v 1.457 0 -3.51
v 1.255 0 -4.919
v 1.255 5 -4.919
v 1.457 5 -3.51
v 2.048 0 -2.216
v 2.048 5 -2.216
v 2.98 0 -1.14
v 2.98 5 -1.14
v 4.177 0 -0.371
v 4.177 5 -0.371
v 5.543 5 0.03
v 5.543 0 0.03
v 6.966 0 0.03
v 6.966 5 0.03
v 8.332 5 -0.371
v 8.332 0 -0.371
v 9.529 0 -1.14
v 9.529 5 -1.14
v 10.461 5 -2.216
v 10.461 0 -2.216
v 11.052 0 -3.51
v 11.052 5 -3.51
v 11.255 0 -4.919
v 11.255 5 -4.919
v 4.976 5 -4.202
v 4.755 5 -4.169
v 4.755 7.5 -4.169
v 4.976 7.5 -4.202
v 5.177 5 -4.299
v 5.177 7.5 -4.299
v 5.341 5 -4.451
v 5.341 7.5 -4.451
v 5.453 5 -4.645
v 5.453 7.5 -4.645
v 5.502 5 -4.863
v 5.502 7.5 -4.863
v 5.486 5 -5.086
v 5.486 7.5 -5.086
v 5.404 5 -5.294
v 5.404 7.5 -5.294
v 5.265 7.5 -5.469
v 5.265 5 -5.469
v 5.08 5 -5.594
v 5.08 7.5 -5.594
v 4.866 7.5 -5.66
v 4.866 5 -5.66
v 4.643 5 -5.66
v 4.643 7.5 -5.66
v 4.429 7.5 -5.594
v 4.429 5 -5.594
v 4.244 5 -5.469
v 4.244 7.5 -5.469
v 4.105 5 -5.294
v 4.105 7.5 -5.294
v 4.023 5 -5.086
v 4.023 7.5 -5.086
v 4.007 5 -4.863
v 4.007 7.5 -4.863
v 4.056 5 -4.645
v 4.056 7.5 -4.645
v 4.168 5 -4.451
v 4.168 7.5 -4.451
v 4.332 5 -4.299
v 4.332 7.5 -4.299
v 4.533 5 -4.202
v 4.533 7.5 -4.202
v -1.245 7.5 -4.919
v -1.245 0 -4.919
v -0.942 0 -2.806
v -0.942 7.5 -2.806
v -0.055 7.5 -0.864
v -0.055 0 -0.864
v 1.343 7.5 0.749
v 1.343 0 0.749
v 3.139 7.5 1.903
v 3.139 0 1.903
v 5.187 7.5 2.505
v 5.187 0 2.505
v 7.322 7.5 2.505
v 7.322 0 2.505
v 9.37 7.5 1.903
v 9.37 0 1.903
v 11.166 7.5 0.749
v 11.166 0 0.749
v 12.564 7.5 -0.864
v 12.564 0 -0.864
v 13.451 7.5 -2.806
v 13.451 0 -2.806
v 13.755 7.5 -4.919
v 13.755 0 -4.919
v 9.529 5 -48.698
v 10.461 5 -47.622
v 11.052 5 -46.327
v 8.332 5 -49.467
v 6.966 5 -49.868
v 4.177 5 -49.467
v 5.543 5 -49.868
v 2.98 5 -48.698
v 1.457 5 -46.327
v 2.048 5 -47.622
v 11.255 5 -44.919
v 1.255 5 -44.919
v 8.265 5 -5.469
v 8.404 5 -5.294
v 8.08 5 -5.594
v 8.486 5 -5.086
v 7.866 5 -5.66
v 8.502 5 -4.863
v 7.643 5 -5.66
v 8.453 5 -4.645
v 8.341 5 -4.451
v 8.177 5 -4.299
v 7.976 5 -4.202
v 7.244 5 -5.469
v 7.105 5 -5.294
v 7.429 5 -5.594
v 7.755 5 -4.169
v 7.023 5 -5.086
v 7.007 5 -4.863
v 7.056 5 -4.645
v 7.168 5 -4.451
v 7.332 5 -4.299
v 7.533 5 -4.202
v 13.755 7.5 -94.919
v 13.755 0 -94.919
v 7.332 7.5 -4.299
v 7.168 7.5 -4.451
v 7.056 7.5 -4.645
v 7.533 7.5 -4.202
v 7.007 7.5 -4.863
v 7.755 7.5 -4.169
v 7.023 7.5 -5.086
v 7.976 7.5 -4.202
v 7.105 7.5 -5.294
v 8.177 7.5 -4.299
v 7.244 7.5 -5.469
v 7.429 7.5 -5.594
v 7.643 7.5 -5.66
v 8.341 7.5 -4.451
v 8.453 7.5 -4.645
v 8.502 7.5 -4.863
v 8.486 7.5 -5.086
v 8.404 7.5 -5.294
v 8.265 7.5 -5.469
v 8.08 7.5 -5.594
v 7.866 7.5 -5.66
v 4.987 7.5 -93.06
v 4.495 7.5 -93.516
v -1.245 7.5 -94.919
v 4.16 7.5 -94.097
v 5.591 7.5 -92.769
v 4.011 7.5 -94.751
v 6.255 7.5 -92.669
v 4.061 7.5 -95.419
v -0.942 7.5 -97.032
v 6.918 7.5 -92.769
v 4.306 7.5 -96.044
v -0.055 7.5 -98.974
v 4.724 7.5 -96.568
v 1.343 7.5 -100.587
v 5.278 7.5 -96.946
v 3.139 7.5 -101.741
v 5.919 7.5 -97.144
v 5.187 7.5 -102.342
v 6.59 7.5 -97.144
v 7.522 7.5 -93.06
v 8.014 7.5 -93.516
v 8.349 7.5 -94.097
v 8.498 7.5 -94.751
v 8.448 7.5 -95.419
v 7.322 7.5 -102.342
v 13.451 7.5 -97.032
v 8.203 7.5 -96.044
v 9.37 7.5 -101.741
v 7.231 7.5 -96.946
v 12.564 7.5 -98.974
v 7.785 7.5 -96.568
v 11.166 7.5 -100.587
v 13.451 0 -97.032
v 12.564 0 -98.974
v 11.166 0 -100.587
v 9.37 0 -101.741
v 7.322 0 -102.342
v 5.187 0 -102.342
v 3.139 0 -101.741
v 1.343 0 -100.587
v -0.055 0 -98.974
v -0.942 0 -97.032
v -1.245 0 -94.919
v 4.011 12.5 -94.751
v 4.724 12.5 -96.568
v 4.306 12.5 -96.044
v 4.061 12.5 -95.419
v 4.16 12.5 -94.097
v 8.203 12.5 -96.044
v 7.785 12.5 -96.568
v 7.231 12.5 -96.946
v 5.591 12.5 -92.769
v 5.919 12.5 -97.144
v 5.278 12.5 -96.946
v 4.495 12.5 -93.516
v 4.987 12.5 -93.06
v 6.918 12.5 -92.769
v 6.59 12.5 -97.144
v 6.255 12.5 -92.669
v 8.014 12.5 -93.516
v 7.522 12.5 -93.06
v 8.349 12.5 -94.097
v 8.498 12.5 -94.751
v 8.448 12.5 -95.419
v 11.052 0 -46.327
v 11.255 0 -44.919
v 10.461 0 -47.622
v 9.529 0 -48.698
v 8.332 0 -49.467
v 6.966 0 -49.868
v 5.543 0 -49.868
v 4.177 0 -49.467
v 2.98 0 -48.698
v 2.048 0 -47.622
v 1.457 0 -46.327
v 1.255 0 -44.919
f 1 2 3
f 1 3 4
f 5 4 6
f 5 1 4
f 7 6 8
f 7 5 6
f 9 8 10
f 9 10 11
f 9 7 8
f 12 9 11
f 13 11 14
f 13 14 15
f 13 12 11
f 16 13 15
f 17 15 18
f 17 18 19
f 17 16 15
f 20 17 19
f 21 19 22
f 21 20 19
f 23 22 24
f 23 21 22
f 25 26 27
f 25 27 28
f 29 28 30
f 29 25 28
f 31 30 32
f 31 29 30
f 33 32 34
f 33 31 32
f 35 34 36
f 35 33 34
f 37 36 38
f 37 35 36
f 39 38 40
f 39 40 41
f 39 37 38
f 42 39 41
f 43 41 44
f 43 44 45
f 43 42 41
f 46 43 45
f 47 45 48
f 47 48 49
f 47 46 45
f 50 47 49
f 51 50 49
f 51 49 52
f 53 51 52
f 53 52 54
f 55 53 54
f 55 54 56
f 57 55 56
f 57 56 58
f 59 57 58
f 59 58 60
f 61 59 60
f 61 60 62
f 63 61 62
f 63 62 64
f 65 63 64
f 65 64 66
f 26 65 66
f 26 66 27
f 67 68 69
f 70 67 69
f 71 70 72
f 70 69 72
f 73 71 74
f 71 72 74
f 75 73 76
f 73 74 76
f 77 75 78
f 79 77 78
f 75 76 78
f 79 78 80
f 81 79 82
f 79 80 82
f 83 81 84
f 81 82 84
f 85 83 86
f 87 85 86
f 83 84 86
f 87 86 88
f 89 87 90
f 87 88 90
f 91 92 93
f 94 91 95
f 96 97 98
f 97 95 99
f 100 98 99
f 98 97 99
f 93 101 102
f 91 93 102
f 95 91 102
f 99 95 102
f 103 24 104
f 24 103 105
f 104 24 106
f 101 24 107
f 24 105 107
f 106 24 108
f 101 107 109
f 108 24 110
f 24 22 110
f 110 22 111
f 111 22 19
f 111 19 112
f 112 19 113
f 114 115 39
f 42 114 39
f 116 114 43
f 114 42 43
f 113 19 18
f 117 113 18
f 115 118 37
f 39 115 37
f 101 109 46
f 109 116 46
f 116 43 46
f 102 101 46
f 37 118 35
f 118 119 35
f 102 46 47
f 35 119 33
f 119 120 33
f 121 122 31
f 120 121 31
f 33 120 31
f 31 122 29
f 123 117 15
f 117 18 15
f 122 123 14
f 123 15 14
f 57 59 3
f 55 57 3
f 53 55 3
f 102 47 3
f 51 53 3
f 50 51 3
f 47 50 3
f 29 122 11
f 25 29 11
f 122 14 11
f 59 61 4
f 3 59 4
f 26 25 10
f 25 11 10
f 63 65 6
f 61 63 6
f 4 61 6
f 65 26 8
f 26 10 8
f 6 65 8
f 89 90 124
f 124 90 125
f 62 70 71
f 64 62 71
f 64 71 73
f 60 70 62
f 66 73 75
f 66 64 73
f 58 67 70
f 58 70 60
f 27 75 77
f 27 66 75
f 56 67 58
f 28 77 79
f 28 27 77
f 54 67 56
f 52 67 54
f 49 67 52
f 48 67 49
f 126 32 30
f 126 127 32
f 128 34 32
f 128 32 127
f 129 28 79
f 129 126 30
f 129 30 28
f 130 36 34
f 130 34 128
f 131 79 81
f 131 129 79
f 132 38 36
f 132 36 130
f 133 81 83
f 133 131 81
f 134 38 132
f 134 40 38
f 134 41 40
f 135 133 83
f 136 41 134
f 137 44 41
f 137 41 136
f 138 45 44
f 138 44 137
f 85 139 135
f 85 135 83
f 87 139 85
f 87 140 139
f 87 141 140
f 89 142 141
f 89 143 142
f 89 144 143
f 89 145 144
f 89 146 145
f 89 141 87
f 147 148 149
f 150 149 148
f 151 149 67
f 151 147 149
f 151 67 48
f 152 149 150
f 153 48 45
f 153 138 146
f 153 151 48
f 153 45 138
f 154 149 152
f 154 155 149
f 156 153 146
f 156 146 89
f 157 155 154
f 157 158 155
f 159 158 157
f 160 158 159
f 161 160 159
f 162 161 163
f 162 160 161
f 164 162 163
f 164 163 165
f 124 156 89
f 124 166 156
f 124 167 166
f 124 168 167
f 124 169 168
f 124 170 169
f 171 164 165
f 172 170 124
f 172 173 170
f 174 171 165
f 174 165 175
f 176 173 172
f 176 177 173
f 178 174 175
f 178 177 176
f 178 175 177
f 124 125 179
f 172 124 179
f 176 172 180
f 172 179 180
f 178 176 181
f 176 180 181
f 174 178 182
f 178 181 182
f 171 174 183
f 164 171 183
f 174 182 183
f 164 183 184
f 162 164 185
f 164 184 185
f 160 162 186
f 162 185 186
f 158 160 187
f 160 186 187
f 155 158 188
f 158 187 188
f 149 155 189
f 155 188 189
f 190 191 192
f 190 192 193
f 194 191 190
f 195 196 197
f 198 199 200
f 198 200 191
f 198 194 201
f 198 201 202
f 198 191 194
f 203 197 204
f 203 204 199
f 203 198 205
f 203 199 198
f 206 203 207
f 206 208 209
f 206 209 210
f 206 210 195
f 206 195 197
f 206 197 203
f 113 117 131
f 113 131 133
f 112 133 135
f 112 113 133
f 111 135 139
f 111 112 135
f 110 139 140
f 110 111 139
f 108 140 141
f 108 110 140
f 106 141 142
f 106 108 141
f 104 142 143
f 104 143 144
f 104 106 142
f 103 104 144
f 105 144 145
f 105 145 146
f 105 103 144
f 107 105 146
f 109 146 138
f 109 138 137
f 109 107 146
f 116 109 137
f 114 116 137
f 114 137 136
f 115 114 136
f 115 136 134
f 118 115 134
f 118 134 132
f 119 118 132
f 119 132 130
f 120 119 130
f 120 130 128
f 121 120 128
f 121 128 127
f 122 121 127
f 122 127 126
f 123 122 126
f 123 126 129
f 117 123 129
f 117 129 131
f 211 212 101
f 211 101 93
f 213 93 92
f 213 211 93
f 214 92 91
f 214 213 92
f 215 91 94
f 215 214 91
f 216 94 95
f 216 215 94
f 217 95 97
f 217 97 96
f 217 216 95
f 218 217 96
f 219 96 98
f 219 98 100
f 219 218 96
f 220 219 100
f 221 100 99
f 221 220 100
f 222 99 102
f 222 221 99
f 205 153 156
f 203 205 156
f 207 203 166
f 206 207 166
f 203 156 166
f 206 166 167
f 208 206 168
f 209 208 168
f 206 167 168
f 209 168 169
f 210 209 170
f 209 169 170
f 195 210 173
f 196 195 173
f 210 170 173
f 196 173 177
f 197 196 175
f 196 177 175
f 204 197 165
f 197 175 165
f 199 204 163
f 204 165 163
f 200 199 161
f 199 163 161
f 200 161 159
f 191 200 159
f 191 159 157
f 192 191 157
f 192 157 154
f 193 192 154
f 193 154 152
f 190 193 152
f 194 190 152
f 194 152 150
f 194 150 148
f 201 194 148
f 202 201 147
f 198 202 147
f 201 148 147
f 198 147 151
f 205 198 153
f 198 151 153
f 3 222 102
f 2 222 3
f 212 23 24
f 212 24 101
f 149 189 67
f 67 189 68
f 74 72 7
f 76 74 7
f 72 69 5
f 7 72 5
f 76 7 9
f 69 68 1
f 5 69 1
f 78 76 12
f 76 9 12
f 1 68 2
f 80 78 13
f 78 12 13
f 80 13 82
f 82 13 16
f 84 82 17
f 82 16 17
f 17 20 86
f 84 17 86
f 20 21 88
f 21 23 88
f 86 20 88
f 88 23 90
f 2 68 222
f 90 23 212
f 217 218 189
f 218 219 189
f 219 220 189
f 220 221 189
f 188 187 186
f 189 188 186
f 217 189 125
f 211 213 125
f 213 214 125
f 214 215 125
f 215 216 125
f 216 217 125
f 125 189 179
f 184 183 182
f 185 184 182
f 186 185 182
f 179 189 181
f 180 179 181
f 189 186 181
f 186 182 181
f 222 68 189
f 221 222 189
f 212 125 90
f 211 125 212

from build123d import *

# Parameters (mm, degrees)
SKETCH2_R           = 0.75
BOSS_EXTRUDE1_DEPTH = 7.5
CUT_EXTRUDE1_DEPTH  = 5
SKETCH4_R           = 2.25
BOSS_EXTRUDE2_DEPTH = 5


with BuildPart() as part:
    # Sketch2 → Boss-Extrude1 (new body)
    with BuildSketch(Plane(origin=(0, 0, 0), x_dir=(1, 0, 0), z_dir=(0, 1, 0))):
        with BuildLine():
            Line((-1.245487365, 94.918772563), (-1.245487365, 4.918772563))
            ThreePointArc((-1.245487365, 4.918772563), (6.254512635, -2.581227437), (13.754512635, 4.918772563))
            Line((13.754512635, 4.918772563), (13.754512635, 94.918772563))
            ThreePointArc((13.754512635, 94.918772563), (6.254512635, 102.418772563), (-1.245487365, 94.918772563))
        make_face()
        with Locations(Location((4.754512635, 4.918772563, 0), (0, 0, 270))):
            Circle(SKETCH2_R, mode=Mode.SUBTRACT)
        with Locations(Location((7.754512635, 4.918772563, 0), (0, 0, 270))):
            Circle(SKETCH2_R, mode=Mode.SUBTRACT)
    extrude(amount=BOSS_EXTRUDE1_DEPTH)

    # Sketch3 → Cut-Extrude1 (cut)
    with BuildSketch(Plane.XZ):
        with BuildLine():
            Line((11.254512635, -4.918772563), (11.254512635, -44.918772563))
            ThreePointArc((11.254512635, -44.918772563), (6.254512635, -49.918772563), (1.254512635, -44.918772563))
            Line((1.254512635, -44.918772563), (1.254512635, -4.918772563))
            ThreePointArc((1.254512635, -4.918772563), (6.254512635, 0.081227437), (11.254512635, -4.918772563))
        make_face()
    extrude(amount=-CUT_EXTRUDE1_DEPTH, mode=Mode.SUBTRACT)

    # Sketch4 → Boss-Extrude2 (add)
    with BuildSketch(Plane(origin=(0, 7.5, 0), x_dir=(1, 0, 0), z_dir=(0, 1, 0))):
        with Locations(Location((6.254512635, 94.918772563, 0), (0, 0, 270))):
            Circle(SKETCH4_R)
    extrude(amount=BOSS_EXTRUDE2_DEPTH)


solid = part.part
